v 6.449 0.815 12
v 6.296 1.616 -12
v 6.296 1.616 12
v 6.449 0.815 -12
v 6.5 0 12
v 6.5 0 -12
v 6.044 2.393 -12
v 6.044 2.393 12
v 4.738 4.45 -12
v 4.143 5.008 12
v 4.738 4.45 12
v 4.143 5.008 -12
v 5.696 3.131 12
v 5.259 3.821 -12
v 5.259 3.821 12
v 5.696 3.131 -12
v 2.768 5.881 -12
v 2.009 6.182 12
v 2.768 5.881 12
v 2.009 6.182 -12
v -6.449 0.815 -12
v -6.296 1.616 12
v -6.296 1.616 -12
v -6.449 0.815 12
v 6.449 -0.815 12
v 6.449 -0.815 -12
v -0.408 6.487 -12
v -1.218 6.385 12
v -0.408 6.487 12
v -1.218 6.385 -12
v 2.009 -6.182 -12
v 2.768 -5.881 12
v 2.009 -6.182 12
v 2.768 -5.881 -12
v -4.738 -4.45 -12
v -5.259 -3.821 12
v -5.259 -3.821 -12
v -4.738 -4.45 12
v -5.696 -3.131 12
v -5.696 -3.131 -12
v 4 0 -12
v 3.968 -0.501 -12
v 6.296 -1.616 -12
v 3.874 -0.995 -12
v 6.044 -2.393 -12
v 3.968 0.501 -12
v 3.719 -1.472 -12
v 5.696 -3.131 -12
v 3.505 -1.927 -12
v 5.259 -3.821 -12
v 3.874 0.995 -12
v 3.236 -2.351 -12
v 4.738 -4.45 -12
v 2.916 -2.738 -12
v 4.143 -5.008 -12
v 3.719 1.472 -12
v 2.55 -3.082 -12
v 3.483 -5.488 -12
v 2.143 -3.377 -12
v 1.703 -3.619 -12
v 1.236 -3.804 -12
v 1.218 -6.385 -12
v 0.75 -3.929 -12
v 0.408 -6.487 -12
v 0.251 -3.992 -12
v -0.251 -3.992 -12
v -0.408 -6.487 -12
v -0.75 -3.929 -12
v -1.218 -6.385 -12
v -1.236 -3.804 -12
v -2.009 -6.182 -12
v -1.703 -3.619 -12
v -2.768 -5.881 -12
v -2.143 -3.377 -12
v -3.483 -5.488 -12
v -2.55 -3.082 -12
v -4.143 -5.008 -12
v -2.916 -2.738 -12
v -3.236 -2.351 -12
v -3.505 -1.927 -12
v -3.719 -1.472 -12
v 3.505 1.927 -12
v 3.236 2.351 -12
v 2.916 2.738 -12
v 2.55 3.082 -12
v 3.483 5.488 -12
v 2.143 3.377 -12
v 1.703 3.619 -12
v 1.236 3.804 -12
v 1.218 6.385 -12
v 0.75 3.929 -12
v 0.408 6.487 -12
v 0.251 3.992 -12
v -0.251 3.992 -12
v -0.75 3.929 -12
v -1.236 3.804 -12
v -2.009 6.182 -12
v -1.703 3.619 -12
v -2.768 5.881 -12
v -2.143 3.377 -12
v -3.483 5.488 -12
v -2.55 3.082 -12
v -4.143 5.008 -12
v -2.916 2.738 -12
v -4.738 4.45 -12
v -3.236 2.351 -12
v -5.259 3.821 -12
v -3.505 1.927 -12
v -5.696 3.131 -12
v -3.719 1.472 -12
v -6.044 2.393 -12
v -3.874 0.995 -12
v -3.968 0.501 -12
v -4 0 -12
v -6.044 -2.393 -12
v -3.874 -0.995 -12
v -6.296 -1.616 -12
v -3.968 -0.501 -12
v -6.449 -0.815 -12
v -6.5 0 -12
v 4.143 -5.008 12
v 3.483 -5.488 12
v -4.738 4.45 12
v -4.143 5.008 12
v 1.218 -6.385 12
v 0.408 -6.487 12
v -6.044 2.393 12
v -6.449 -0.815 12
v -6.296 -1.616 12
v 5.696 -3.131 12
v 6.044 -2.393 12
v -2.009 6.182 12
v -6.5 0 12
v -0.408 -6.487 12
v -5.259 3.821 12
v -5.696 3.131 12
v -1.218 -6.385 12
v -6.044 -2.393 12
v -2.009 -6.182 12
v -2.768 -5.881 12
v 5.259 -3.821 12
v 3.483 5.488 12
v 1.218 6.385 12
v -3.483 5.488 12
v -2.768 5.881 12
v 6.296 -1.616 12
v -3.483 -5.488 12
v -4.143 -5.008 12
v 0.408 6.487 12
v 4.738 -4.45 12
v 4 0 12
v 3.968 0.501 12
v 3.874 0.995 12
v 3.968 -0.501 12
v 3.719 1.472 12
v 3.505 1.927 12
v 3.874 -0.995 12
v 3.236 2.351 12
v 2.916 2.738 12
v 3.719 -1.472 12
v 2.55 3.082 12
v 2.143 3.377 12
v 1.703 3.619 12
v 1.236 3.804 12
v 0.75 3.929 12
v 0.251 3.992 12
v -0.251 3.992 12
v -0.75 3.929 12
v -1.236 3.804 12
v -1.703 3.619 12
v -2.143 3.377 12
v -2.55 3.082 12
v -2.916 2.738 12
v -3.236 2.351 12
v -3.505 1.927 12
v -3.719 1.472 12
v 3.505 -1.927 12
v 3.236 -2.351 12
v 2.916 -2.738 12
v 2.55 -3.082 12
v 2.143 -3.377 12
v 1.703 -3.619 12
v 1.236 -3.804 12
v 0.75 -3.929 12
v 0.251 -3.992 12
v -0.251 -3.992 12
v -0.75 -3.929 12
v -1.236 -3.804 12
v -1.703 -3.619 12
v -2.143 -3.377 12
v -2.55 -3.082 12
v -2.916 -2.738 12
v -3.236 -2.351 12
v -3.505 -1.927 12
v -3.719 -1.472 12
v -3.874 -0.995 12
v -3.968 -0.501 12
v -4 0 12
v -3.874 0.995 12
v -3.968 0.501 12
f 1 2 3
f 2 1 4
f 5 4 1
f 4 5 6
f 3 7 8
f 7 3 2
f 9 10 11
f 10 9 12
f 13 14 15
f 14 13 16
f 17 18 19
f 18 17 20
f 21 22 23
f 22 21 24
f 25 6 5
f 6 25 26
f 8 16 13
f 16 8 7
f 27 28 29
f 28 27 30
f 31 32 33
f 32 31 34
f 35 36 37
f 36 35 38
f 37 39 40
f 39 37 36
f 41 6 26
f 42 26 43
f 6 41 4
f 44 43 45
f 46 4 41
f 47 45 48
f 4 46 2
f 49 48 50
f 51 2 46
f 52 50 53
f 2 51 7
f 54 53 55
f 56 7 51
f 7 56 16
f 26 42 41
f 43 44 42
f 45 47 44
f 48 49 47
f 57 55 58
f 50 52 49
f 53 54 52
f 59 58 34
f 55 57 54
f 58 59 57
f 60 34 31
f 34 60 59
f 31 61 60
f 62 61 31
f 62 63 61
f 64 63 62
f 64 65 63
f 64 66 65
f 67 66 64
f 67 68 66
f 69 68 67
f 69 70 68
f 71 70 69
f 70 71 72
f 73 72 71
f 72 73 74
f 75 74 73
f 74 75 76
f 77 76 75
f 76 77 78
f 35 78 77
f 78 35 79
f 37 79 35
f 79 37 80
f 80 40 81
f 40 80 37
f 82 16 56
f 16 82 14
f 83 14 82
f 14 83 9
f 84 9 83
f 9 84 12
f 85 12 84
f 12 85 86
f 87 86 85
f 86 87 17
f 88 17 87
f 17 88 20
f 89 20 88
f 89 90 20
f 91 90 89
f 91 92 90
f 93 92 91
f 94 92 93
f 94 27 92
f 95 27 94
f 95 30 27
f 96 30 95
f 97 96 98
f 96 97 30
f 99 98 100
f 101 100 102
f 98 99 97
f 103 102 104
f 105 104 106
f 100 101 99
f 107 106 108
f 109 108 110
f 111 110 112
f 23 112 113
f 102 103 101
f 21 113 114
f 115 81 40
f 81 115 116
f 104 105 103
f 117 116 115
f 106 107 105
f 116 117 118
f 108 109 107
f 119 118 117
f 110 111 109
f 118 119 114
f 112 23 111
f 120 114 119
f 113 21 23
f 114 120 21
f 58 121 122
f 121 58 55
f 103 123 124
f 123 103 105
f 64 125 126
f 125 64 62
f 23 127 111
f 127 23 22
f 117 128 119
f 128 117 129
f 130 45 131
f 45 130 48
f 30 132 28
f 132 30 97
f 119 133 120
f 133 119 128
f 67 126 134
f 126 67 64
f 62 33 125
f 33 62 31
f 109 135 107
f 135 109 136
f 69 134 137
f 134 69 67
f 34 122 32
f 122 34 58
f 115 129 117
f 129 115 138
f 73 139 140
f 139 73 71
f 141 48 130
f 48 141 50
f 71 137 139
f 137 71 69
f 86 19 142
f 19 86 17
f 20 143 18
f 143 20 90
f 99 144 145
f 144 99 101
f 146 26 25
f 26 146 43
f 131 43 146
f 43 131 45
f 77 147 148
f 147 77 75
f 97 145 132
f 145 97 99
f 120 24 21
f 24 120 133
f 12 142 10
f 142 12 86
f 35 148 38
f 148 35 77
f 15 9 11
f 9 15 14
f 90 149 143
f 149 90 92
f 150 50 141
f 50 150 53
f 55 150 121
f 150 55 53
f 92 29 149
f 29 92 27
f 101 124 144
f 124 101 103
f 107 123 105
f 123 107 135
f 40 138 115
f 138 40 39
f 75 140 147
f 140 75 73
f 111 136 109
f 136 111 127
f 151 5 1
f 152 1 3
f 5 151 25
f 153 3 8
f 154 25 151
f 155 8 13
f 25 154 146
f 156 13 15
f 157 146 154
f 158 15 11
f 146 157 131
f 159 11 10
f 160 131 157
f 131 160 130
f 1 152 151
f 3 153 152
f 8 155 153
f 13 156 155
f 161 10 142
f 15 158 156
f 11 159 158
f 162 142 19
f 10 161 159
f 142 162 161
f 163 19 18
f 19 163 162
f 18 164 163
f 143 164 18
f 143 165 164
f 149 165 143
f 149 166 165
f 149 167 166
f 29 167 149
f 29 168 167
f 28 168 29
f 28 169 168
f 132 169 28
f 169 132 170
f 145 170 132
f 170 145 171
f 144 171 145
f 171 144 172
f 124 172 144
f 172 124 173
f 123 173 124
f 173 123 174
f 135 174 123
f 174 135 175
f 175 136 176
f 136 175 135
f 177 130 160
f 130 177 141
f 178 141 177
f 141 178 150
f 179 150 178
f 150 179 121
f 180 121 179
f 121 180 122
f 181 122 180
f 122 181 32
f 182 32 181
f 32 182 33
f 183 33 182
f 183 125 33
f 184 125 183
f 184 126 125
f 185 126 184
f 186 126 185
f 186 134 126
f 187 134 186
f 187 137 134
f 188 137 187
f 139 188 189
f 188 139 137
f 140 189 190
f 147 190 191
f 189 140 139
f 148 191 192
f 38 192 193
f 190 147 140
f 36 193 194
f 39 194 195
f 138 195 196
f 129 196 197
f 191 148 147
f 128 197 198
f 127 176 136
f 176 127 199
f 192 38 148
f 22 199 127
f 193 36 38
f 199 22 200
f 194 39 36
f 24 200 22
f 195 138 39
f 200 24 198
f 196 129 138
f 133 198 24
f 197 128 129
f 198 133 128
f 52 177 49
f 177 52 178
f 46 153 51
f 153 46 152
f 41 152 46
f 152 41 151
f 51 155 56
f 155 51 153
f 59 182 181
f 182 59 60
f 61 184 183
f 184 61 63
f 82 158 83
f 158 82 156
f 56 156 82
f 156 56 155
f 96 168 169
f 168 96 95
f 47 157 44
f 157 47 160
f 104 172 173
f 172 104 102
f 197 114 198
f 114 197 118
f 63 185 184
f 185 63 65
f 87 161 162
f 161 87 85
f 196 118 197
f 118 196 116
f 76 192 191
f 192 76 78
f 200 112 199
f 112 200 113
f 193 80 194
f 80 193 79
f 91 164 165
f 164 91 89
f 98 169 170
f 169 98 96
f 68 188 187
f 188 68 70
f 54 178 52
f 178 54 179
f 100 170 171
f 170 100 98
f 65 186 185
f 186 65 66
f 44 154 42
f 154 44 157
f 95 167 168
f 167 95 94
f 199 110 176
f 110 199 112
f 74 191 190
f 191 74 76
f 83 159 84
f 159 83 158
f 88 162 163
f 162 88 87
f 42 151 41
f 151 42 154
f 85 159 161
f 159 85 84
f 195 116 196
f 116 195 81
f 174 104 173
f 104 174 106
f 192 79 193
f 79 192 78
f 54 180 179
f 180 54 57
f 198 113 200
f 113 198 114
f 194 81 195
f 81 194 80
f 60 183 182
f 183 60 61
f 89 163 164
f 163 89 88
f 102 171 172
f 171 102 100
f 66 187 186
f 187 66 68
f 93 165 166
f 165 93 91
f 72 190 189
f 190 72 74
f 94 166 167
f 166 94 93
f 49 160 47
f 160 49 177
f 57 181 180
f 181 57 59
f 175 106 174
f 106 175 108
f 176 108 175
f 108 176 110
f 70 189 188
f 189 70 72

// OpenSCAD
$fn = 50;


difference() {
	union() {
		translate(v = [0, 0, -12.0000000000]) {
			cylinder(h = 24, r = 6.5000000000);
		}
	}
	union() {
		translate(v = [0, 0, -100.0000000000]) {
			cylinder(h = 200, r = 4.0000000000);
		}
	}
}
